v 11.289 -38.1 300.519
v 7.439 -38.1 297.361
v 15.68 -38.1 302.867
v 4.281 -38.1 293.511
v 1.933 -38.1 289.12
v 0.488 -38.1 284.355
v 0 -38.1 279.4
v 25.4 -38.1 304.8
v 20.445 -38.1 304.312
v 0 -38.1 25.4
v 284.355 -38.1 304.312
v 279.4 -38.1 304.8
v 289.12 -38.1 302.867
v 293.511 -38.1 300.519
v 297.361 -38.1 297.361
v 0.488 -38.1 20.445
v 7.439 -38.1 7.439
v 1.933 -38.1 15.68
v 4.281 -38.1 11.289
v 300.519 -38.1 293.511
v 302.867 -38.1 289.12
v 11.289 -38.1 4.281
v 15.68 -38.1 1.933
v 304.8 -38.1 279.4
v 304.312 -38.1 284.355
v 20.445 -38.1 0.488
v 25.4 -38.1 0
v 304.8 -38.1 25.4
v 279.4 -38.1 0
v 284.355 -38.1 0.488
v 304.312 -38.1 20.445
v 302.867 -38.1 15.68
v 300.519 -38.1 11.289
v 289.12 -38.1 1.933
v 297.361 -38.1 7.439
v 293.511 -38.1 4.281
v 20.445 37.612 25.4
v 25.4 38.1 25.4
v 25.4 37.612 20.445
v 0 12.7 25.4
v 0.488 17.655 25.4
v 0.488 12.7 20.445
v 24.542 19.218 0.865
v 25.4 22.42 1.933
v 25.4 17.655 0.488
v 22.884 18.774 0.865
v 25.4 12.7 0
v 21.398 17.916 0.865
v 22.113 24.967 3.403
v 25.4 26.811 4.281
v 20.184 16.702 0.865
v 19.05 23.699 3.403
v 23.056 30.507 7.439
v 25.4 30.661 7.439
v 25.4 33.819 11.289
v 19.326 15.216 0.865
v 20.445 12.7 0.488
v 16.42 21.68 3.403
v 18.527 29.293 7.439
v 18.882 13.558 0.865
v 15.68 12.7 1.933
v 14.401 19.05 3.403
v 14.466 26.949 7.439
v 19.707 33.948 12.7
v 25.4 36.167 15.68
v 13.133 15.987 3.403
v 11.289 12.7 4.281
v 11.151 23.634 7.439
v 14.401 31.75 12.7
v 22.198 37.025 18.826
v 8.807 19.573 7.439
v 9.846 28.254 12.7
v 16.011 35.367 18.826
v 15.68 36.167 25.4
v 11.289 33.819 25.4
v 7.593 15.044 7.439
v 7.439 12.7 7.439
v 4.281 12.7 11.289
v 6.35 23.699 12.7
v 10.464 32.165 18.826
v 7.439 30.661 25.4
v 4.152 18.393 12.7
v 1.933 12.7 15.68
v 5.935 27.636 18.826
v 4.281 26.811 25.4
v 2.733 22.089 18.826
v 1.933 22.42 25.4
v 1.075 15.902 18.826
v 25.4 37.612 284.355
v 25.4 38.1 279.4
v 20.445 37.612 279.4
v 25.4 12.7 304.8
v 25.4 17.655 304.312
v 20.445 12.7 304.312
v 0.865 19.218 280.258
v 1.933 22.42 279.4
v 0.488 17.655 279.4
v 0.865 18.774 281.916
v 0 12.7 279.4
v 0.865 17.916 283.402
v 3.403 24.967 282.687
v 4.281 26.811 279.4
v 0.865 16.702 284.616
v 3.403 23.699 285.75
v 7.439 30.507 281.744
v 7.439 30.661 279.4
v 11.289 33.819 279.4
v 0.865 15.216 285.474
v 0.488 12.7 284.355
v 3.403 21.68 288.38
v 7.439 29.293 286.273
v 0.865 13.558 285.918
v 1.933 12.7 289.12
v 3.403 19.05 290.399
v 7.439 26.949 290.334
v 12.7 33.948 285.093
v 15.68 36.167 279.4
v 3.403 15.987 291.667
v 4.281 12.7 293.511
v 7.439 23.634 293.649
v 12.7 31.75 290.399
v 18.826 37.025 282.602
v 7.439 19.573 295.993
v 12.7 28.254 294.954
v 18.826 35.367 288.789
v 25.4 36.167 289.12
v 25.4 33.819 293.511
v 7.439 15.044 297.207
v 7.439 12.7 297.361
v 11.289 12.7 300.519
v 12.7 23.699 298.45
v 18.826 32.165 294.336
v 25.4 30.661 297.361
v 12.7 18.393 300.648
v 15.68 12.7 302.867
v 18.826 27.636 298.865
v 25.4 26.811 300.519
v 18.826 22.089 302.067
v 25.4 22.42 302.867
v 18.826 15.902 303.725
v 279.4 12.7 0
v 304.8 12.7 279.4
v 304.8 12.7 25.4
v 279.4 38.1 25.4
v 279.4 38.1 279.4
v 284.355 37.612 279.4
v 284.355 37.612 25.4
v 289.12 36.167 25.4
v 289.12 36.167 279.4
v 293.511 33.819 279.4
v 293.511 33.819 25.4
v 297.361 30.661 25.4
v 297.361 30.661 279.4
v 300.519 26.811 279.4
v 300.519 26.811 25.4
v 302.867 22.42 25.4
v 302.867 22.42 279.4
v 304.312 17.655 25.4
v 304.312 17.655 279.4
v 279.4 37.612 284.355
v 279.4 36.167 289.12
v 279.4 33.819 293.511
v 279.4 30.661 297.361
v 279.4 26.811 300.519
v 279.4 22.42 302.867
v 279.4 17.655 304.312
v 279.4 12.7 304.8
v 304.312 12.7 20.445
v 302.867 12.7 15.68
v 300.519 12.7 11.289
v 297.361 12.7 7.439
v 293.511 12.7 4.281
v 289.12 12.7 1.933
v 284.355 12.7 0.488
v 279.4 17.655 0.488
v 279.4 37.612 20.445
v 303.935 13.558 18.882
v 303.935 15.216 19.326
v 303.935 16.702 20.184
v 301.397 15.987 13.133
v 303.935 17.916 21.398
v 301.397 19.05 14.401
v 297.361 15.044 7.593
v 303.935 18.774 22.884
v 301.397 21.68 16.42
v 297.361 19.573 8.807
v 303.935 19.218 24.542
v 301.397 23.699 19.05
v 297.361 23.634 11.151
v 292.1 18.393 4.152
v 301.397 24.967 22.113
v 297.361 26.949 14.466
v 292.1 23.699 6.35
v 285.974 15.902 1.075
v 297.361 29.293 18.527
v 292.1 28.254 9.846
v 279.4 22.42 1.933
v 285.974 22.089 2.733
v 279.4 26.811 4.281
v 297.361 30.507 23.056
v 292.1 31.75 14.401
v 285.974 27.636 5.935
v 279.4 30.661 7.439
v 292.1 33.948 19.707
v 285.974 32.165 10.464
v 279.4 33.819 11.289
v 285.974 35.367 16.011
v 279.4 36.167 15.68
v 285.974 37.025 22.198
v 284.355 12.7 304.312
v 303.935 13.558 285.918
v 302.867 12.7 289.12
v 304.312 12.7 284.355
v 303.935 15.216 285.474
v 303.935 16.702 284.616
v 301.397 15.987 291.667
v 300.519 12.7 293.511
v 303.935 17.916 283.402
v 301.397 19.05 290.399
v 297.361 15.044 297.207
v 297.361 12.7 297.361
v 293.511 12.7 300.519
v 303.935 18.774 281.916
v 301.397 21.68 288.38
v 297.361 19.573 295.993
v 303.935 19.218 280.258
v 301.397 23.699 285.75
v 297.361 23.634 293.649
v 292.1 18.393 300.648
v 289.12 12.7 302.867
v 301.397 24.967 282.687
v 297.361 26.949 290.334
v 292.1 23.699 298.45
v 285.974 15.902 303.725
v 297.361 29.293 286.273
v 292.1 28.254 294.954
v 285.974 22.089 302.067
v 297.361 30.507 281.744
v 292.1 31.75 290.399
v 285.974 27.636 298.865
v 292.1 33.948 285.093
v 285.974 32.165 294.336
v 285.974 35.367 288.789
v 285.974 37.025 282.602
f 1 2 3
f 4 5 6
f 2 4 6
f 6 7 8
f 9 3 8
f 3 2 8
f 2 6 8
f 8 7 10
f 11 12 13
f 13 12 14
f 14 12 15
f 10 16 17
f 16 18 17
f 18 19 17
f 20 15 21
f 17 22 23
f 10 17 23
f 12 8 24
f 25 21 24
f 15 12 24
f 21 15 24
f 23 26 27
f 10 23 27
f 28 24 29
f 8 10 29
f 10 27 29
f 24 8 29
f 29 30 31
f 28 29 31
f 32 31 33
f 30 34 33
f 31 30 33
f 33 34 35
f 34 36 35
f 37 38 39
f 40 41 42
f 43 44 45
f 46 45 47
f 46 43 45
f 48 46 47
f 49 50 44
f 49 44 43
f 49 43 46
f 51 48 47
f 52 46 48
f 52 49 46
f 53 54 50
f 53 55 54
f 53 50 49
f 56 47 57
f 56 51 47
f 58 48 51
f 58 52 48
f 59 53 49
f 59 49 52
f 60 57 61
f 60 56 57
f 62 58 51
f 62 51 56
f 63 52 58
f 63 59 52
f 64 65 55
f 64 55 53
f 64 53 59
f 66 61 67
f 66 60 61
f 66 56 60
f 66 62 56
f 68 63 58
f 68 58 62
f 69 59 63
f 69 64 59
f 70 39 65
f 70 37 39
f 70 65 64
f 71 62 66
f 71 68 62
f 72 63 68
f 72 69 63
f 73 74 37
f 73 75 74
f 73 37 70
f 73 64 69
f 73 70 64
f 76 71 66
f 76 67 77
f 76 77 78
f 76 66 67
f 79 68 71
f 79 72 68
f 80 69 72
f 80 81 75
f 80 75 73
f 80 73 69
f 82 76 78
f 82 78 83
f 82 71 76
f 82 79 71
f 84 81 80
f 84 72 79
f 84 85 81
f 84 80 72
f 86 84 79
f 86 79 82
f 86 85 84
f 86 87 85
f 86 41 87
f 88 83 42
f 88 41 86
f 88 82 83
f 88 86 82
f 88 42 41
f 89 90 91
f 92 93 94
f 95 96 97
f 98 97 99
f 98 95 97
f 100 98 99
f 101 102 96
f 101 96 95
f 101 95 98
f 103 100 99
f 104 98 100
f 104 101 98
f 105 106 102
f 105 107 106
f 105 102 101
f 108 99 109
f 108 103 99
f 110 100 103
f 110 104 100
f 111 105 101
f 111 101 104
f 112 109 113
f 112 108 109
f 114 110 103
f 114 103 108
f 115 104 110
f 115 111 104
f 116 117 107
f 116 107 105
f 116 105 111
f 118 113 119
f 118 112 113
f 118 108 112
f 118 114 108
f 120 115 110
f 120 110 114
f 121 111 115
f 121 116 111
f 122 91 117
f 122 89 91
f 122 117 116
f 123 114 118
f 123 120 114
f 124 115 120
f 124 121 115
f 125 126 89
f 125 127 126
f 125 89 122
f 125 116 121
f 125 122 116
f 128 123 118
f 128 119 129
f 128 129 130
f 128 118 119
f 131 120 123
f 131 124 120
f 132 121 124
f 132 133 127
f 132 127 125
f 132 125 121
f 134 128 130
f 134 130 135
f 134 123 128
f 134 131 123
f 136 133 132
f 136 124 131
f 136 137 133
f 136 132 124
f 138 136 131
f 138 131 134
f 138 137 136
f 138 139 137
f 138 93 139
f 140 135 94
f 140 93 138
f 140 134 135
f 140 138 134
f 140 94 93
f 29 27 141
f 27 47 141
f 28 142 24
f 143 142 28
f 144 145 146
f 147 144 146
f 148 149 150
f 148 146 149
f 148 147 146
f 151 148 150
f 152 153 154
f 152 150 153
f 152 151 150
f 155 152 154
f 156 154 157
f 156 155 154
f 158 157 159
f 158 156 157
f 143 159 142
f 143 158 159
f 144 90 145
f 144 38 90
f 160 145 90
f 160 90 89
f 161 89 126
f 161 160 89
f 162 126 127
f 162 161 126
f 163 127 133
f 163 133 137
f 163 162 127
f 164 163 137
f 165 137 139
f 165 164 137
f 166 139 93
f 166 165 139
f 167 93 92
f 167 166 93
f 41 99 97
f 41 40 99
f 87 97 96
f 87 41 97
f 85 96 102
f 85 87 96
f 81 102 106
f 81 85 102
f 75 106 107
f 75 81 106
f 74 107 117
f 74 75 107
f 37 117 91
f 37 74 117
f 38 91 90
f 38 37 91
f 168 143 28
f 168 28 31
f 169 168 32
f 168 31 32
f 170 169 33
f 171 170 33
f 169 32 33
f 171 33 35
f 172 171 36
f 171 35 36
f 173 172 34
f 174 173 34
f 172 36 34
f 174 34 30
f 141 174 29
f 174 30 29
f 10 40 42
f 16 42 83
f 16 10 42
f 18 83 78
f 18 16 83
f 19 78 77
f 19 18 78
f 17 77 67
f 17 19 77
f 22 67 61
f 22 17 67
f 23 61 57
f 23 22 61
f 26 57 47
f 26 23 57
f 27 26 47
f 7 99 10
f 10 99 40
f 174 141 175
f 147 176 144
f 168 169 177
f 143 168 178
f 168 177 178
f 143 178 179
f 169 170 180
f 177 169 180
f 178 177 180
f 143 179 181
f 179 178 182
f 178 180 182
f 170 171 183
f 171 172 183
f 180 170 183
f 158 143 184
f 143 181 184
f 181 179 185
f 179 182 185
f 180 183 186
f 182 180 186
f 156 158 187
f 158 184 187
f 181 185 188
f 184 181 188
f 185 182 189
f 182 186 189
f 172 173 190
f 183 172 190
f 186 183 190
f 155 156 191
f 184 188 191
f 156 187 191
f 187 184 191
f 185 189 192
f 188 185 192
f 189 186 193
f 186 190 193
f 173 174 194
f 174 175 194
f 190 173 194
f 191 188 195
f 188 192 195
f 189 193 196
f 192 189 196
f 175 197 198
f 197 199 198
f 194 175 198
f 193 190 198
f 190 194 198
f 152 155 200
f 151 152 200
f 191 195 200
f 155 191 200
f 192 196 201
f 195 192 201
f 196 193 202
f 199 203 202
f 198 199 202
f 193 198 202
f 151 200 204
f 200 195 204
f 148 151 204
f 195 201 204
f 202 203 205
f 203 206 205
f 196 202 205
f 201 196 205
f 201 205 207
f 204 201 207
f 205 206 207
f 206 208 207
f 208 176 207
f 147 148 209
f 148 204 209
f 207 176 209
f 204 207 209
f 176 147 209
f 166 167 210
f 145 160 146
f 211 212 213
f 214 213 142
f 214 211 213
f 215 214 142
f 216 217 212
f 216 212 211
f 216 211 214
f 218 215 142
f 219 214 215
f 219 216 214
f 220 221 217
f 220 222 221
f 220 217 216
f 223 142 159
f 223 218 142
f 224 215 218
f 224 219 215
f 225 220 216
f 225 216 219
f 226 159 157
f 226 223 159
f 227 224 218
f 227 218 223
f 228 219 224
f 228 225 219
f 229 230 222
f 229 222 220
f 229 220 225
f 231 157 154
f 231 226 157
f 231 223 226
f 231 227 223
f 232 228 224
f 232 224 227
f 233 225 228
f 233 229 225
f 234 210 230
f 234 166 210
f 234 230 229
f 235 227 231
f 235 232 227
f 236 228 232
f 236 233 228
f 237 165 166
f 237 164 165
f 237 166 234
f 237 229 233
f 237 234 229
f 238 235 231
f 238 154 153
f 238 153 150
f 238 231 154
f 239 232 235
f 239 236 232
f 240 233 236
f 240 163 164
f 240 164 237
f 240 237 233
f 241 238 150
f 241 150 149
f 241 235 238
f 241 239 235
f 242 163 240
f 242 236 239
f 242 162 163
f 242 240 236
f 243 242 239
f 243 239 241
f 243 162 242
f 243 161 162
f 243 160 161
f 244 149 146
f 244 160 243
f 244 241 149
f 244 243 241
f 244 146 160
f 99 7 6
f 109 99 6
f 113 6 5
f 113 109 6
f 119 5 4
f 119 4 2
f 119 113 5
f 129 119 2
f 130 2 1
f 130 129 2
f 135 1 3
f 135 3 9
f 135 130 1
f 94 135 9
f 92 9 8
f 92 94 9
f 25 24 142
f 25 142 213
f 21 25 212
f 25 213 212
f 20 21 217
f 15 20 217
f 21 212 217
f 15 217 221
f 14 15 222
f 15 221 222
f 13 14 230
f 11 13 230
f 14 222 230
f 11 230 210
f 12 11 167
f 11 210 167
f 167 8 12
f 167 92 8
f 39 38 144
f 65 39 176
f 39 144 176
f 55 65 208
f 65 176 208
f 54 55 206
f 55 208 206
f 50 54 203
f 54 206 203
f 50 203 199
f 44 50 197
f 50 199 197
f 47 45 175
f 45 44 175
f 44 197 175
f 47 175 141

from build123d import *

# Parameters (mm, degrees)
SKETCH1_W           = 304.8
SKETCH1_H           = 304.8
BOSS_EXTRUDE2_DEPTH = 38.1
FILLET1_R           = 25.4


with BuildPart() as part:
    # Sketch1 → Boss-Extrude2 (new, symmetric)
    with BuildSketch(Plane(origin=(0, 0, 0), x_dir=(1, 0, 0), z_dir=(0, 1, 0))):
        with Locations((152.4, -152.4)):
            Rectangle(SKETCH1_W, SKETCH1_H)
    extrude(amount=BOSS_EXTRUDE2_DEPTH, both=True)

    # Fillet1
    fillet1_edges = [part.edges().sort_by_distance(p)[0] for p in [
        (152.4, 38.1, 304.8),
        (0, 38.1, 152.4),
        (152.4, 38.1, 0),
        (0, 0, 0),
        (0, 0, 304.8),
        (304.8, 0, 304.8),
        (304.8, 0, 0),
        (304.8, 38.1, 152.4),
    ]]
    fillet(fillet1_edges, radius=FILLET1_R)


solid = part.part
